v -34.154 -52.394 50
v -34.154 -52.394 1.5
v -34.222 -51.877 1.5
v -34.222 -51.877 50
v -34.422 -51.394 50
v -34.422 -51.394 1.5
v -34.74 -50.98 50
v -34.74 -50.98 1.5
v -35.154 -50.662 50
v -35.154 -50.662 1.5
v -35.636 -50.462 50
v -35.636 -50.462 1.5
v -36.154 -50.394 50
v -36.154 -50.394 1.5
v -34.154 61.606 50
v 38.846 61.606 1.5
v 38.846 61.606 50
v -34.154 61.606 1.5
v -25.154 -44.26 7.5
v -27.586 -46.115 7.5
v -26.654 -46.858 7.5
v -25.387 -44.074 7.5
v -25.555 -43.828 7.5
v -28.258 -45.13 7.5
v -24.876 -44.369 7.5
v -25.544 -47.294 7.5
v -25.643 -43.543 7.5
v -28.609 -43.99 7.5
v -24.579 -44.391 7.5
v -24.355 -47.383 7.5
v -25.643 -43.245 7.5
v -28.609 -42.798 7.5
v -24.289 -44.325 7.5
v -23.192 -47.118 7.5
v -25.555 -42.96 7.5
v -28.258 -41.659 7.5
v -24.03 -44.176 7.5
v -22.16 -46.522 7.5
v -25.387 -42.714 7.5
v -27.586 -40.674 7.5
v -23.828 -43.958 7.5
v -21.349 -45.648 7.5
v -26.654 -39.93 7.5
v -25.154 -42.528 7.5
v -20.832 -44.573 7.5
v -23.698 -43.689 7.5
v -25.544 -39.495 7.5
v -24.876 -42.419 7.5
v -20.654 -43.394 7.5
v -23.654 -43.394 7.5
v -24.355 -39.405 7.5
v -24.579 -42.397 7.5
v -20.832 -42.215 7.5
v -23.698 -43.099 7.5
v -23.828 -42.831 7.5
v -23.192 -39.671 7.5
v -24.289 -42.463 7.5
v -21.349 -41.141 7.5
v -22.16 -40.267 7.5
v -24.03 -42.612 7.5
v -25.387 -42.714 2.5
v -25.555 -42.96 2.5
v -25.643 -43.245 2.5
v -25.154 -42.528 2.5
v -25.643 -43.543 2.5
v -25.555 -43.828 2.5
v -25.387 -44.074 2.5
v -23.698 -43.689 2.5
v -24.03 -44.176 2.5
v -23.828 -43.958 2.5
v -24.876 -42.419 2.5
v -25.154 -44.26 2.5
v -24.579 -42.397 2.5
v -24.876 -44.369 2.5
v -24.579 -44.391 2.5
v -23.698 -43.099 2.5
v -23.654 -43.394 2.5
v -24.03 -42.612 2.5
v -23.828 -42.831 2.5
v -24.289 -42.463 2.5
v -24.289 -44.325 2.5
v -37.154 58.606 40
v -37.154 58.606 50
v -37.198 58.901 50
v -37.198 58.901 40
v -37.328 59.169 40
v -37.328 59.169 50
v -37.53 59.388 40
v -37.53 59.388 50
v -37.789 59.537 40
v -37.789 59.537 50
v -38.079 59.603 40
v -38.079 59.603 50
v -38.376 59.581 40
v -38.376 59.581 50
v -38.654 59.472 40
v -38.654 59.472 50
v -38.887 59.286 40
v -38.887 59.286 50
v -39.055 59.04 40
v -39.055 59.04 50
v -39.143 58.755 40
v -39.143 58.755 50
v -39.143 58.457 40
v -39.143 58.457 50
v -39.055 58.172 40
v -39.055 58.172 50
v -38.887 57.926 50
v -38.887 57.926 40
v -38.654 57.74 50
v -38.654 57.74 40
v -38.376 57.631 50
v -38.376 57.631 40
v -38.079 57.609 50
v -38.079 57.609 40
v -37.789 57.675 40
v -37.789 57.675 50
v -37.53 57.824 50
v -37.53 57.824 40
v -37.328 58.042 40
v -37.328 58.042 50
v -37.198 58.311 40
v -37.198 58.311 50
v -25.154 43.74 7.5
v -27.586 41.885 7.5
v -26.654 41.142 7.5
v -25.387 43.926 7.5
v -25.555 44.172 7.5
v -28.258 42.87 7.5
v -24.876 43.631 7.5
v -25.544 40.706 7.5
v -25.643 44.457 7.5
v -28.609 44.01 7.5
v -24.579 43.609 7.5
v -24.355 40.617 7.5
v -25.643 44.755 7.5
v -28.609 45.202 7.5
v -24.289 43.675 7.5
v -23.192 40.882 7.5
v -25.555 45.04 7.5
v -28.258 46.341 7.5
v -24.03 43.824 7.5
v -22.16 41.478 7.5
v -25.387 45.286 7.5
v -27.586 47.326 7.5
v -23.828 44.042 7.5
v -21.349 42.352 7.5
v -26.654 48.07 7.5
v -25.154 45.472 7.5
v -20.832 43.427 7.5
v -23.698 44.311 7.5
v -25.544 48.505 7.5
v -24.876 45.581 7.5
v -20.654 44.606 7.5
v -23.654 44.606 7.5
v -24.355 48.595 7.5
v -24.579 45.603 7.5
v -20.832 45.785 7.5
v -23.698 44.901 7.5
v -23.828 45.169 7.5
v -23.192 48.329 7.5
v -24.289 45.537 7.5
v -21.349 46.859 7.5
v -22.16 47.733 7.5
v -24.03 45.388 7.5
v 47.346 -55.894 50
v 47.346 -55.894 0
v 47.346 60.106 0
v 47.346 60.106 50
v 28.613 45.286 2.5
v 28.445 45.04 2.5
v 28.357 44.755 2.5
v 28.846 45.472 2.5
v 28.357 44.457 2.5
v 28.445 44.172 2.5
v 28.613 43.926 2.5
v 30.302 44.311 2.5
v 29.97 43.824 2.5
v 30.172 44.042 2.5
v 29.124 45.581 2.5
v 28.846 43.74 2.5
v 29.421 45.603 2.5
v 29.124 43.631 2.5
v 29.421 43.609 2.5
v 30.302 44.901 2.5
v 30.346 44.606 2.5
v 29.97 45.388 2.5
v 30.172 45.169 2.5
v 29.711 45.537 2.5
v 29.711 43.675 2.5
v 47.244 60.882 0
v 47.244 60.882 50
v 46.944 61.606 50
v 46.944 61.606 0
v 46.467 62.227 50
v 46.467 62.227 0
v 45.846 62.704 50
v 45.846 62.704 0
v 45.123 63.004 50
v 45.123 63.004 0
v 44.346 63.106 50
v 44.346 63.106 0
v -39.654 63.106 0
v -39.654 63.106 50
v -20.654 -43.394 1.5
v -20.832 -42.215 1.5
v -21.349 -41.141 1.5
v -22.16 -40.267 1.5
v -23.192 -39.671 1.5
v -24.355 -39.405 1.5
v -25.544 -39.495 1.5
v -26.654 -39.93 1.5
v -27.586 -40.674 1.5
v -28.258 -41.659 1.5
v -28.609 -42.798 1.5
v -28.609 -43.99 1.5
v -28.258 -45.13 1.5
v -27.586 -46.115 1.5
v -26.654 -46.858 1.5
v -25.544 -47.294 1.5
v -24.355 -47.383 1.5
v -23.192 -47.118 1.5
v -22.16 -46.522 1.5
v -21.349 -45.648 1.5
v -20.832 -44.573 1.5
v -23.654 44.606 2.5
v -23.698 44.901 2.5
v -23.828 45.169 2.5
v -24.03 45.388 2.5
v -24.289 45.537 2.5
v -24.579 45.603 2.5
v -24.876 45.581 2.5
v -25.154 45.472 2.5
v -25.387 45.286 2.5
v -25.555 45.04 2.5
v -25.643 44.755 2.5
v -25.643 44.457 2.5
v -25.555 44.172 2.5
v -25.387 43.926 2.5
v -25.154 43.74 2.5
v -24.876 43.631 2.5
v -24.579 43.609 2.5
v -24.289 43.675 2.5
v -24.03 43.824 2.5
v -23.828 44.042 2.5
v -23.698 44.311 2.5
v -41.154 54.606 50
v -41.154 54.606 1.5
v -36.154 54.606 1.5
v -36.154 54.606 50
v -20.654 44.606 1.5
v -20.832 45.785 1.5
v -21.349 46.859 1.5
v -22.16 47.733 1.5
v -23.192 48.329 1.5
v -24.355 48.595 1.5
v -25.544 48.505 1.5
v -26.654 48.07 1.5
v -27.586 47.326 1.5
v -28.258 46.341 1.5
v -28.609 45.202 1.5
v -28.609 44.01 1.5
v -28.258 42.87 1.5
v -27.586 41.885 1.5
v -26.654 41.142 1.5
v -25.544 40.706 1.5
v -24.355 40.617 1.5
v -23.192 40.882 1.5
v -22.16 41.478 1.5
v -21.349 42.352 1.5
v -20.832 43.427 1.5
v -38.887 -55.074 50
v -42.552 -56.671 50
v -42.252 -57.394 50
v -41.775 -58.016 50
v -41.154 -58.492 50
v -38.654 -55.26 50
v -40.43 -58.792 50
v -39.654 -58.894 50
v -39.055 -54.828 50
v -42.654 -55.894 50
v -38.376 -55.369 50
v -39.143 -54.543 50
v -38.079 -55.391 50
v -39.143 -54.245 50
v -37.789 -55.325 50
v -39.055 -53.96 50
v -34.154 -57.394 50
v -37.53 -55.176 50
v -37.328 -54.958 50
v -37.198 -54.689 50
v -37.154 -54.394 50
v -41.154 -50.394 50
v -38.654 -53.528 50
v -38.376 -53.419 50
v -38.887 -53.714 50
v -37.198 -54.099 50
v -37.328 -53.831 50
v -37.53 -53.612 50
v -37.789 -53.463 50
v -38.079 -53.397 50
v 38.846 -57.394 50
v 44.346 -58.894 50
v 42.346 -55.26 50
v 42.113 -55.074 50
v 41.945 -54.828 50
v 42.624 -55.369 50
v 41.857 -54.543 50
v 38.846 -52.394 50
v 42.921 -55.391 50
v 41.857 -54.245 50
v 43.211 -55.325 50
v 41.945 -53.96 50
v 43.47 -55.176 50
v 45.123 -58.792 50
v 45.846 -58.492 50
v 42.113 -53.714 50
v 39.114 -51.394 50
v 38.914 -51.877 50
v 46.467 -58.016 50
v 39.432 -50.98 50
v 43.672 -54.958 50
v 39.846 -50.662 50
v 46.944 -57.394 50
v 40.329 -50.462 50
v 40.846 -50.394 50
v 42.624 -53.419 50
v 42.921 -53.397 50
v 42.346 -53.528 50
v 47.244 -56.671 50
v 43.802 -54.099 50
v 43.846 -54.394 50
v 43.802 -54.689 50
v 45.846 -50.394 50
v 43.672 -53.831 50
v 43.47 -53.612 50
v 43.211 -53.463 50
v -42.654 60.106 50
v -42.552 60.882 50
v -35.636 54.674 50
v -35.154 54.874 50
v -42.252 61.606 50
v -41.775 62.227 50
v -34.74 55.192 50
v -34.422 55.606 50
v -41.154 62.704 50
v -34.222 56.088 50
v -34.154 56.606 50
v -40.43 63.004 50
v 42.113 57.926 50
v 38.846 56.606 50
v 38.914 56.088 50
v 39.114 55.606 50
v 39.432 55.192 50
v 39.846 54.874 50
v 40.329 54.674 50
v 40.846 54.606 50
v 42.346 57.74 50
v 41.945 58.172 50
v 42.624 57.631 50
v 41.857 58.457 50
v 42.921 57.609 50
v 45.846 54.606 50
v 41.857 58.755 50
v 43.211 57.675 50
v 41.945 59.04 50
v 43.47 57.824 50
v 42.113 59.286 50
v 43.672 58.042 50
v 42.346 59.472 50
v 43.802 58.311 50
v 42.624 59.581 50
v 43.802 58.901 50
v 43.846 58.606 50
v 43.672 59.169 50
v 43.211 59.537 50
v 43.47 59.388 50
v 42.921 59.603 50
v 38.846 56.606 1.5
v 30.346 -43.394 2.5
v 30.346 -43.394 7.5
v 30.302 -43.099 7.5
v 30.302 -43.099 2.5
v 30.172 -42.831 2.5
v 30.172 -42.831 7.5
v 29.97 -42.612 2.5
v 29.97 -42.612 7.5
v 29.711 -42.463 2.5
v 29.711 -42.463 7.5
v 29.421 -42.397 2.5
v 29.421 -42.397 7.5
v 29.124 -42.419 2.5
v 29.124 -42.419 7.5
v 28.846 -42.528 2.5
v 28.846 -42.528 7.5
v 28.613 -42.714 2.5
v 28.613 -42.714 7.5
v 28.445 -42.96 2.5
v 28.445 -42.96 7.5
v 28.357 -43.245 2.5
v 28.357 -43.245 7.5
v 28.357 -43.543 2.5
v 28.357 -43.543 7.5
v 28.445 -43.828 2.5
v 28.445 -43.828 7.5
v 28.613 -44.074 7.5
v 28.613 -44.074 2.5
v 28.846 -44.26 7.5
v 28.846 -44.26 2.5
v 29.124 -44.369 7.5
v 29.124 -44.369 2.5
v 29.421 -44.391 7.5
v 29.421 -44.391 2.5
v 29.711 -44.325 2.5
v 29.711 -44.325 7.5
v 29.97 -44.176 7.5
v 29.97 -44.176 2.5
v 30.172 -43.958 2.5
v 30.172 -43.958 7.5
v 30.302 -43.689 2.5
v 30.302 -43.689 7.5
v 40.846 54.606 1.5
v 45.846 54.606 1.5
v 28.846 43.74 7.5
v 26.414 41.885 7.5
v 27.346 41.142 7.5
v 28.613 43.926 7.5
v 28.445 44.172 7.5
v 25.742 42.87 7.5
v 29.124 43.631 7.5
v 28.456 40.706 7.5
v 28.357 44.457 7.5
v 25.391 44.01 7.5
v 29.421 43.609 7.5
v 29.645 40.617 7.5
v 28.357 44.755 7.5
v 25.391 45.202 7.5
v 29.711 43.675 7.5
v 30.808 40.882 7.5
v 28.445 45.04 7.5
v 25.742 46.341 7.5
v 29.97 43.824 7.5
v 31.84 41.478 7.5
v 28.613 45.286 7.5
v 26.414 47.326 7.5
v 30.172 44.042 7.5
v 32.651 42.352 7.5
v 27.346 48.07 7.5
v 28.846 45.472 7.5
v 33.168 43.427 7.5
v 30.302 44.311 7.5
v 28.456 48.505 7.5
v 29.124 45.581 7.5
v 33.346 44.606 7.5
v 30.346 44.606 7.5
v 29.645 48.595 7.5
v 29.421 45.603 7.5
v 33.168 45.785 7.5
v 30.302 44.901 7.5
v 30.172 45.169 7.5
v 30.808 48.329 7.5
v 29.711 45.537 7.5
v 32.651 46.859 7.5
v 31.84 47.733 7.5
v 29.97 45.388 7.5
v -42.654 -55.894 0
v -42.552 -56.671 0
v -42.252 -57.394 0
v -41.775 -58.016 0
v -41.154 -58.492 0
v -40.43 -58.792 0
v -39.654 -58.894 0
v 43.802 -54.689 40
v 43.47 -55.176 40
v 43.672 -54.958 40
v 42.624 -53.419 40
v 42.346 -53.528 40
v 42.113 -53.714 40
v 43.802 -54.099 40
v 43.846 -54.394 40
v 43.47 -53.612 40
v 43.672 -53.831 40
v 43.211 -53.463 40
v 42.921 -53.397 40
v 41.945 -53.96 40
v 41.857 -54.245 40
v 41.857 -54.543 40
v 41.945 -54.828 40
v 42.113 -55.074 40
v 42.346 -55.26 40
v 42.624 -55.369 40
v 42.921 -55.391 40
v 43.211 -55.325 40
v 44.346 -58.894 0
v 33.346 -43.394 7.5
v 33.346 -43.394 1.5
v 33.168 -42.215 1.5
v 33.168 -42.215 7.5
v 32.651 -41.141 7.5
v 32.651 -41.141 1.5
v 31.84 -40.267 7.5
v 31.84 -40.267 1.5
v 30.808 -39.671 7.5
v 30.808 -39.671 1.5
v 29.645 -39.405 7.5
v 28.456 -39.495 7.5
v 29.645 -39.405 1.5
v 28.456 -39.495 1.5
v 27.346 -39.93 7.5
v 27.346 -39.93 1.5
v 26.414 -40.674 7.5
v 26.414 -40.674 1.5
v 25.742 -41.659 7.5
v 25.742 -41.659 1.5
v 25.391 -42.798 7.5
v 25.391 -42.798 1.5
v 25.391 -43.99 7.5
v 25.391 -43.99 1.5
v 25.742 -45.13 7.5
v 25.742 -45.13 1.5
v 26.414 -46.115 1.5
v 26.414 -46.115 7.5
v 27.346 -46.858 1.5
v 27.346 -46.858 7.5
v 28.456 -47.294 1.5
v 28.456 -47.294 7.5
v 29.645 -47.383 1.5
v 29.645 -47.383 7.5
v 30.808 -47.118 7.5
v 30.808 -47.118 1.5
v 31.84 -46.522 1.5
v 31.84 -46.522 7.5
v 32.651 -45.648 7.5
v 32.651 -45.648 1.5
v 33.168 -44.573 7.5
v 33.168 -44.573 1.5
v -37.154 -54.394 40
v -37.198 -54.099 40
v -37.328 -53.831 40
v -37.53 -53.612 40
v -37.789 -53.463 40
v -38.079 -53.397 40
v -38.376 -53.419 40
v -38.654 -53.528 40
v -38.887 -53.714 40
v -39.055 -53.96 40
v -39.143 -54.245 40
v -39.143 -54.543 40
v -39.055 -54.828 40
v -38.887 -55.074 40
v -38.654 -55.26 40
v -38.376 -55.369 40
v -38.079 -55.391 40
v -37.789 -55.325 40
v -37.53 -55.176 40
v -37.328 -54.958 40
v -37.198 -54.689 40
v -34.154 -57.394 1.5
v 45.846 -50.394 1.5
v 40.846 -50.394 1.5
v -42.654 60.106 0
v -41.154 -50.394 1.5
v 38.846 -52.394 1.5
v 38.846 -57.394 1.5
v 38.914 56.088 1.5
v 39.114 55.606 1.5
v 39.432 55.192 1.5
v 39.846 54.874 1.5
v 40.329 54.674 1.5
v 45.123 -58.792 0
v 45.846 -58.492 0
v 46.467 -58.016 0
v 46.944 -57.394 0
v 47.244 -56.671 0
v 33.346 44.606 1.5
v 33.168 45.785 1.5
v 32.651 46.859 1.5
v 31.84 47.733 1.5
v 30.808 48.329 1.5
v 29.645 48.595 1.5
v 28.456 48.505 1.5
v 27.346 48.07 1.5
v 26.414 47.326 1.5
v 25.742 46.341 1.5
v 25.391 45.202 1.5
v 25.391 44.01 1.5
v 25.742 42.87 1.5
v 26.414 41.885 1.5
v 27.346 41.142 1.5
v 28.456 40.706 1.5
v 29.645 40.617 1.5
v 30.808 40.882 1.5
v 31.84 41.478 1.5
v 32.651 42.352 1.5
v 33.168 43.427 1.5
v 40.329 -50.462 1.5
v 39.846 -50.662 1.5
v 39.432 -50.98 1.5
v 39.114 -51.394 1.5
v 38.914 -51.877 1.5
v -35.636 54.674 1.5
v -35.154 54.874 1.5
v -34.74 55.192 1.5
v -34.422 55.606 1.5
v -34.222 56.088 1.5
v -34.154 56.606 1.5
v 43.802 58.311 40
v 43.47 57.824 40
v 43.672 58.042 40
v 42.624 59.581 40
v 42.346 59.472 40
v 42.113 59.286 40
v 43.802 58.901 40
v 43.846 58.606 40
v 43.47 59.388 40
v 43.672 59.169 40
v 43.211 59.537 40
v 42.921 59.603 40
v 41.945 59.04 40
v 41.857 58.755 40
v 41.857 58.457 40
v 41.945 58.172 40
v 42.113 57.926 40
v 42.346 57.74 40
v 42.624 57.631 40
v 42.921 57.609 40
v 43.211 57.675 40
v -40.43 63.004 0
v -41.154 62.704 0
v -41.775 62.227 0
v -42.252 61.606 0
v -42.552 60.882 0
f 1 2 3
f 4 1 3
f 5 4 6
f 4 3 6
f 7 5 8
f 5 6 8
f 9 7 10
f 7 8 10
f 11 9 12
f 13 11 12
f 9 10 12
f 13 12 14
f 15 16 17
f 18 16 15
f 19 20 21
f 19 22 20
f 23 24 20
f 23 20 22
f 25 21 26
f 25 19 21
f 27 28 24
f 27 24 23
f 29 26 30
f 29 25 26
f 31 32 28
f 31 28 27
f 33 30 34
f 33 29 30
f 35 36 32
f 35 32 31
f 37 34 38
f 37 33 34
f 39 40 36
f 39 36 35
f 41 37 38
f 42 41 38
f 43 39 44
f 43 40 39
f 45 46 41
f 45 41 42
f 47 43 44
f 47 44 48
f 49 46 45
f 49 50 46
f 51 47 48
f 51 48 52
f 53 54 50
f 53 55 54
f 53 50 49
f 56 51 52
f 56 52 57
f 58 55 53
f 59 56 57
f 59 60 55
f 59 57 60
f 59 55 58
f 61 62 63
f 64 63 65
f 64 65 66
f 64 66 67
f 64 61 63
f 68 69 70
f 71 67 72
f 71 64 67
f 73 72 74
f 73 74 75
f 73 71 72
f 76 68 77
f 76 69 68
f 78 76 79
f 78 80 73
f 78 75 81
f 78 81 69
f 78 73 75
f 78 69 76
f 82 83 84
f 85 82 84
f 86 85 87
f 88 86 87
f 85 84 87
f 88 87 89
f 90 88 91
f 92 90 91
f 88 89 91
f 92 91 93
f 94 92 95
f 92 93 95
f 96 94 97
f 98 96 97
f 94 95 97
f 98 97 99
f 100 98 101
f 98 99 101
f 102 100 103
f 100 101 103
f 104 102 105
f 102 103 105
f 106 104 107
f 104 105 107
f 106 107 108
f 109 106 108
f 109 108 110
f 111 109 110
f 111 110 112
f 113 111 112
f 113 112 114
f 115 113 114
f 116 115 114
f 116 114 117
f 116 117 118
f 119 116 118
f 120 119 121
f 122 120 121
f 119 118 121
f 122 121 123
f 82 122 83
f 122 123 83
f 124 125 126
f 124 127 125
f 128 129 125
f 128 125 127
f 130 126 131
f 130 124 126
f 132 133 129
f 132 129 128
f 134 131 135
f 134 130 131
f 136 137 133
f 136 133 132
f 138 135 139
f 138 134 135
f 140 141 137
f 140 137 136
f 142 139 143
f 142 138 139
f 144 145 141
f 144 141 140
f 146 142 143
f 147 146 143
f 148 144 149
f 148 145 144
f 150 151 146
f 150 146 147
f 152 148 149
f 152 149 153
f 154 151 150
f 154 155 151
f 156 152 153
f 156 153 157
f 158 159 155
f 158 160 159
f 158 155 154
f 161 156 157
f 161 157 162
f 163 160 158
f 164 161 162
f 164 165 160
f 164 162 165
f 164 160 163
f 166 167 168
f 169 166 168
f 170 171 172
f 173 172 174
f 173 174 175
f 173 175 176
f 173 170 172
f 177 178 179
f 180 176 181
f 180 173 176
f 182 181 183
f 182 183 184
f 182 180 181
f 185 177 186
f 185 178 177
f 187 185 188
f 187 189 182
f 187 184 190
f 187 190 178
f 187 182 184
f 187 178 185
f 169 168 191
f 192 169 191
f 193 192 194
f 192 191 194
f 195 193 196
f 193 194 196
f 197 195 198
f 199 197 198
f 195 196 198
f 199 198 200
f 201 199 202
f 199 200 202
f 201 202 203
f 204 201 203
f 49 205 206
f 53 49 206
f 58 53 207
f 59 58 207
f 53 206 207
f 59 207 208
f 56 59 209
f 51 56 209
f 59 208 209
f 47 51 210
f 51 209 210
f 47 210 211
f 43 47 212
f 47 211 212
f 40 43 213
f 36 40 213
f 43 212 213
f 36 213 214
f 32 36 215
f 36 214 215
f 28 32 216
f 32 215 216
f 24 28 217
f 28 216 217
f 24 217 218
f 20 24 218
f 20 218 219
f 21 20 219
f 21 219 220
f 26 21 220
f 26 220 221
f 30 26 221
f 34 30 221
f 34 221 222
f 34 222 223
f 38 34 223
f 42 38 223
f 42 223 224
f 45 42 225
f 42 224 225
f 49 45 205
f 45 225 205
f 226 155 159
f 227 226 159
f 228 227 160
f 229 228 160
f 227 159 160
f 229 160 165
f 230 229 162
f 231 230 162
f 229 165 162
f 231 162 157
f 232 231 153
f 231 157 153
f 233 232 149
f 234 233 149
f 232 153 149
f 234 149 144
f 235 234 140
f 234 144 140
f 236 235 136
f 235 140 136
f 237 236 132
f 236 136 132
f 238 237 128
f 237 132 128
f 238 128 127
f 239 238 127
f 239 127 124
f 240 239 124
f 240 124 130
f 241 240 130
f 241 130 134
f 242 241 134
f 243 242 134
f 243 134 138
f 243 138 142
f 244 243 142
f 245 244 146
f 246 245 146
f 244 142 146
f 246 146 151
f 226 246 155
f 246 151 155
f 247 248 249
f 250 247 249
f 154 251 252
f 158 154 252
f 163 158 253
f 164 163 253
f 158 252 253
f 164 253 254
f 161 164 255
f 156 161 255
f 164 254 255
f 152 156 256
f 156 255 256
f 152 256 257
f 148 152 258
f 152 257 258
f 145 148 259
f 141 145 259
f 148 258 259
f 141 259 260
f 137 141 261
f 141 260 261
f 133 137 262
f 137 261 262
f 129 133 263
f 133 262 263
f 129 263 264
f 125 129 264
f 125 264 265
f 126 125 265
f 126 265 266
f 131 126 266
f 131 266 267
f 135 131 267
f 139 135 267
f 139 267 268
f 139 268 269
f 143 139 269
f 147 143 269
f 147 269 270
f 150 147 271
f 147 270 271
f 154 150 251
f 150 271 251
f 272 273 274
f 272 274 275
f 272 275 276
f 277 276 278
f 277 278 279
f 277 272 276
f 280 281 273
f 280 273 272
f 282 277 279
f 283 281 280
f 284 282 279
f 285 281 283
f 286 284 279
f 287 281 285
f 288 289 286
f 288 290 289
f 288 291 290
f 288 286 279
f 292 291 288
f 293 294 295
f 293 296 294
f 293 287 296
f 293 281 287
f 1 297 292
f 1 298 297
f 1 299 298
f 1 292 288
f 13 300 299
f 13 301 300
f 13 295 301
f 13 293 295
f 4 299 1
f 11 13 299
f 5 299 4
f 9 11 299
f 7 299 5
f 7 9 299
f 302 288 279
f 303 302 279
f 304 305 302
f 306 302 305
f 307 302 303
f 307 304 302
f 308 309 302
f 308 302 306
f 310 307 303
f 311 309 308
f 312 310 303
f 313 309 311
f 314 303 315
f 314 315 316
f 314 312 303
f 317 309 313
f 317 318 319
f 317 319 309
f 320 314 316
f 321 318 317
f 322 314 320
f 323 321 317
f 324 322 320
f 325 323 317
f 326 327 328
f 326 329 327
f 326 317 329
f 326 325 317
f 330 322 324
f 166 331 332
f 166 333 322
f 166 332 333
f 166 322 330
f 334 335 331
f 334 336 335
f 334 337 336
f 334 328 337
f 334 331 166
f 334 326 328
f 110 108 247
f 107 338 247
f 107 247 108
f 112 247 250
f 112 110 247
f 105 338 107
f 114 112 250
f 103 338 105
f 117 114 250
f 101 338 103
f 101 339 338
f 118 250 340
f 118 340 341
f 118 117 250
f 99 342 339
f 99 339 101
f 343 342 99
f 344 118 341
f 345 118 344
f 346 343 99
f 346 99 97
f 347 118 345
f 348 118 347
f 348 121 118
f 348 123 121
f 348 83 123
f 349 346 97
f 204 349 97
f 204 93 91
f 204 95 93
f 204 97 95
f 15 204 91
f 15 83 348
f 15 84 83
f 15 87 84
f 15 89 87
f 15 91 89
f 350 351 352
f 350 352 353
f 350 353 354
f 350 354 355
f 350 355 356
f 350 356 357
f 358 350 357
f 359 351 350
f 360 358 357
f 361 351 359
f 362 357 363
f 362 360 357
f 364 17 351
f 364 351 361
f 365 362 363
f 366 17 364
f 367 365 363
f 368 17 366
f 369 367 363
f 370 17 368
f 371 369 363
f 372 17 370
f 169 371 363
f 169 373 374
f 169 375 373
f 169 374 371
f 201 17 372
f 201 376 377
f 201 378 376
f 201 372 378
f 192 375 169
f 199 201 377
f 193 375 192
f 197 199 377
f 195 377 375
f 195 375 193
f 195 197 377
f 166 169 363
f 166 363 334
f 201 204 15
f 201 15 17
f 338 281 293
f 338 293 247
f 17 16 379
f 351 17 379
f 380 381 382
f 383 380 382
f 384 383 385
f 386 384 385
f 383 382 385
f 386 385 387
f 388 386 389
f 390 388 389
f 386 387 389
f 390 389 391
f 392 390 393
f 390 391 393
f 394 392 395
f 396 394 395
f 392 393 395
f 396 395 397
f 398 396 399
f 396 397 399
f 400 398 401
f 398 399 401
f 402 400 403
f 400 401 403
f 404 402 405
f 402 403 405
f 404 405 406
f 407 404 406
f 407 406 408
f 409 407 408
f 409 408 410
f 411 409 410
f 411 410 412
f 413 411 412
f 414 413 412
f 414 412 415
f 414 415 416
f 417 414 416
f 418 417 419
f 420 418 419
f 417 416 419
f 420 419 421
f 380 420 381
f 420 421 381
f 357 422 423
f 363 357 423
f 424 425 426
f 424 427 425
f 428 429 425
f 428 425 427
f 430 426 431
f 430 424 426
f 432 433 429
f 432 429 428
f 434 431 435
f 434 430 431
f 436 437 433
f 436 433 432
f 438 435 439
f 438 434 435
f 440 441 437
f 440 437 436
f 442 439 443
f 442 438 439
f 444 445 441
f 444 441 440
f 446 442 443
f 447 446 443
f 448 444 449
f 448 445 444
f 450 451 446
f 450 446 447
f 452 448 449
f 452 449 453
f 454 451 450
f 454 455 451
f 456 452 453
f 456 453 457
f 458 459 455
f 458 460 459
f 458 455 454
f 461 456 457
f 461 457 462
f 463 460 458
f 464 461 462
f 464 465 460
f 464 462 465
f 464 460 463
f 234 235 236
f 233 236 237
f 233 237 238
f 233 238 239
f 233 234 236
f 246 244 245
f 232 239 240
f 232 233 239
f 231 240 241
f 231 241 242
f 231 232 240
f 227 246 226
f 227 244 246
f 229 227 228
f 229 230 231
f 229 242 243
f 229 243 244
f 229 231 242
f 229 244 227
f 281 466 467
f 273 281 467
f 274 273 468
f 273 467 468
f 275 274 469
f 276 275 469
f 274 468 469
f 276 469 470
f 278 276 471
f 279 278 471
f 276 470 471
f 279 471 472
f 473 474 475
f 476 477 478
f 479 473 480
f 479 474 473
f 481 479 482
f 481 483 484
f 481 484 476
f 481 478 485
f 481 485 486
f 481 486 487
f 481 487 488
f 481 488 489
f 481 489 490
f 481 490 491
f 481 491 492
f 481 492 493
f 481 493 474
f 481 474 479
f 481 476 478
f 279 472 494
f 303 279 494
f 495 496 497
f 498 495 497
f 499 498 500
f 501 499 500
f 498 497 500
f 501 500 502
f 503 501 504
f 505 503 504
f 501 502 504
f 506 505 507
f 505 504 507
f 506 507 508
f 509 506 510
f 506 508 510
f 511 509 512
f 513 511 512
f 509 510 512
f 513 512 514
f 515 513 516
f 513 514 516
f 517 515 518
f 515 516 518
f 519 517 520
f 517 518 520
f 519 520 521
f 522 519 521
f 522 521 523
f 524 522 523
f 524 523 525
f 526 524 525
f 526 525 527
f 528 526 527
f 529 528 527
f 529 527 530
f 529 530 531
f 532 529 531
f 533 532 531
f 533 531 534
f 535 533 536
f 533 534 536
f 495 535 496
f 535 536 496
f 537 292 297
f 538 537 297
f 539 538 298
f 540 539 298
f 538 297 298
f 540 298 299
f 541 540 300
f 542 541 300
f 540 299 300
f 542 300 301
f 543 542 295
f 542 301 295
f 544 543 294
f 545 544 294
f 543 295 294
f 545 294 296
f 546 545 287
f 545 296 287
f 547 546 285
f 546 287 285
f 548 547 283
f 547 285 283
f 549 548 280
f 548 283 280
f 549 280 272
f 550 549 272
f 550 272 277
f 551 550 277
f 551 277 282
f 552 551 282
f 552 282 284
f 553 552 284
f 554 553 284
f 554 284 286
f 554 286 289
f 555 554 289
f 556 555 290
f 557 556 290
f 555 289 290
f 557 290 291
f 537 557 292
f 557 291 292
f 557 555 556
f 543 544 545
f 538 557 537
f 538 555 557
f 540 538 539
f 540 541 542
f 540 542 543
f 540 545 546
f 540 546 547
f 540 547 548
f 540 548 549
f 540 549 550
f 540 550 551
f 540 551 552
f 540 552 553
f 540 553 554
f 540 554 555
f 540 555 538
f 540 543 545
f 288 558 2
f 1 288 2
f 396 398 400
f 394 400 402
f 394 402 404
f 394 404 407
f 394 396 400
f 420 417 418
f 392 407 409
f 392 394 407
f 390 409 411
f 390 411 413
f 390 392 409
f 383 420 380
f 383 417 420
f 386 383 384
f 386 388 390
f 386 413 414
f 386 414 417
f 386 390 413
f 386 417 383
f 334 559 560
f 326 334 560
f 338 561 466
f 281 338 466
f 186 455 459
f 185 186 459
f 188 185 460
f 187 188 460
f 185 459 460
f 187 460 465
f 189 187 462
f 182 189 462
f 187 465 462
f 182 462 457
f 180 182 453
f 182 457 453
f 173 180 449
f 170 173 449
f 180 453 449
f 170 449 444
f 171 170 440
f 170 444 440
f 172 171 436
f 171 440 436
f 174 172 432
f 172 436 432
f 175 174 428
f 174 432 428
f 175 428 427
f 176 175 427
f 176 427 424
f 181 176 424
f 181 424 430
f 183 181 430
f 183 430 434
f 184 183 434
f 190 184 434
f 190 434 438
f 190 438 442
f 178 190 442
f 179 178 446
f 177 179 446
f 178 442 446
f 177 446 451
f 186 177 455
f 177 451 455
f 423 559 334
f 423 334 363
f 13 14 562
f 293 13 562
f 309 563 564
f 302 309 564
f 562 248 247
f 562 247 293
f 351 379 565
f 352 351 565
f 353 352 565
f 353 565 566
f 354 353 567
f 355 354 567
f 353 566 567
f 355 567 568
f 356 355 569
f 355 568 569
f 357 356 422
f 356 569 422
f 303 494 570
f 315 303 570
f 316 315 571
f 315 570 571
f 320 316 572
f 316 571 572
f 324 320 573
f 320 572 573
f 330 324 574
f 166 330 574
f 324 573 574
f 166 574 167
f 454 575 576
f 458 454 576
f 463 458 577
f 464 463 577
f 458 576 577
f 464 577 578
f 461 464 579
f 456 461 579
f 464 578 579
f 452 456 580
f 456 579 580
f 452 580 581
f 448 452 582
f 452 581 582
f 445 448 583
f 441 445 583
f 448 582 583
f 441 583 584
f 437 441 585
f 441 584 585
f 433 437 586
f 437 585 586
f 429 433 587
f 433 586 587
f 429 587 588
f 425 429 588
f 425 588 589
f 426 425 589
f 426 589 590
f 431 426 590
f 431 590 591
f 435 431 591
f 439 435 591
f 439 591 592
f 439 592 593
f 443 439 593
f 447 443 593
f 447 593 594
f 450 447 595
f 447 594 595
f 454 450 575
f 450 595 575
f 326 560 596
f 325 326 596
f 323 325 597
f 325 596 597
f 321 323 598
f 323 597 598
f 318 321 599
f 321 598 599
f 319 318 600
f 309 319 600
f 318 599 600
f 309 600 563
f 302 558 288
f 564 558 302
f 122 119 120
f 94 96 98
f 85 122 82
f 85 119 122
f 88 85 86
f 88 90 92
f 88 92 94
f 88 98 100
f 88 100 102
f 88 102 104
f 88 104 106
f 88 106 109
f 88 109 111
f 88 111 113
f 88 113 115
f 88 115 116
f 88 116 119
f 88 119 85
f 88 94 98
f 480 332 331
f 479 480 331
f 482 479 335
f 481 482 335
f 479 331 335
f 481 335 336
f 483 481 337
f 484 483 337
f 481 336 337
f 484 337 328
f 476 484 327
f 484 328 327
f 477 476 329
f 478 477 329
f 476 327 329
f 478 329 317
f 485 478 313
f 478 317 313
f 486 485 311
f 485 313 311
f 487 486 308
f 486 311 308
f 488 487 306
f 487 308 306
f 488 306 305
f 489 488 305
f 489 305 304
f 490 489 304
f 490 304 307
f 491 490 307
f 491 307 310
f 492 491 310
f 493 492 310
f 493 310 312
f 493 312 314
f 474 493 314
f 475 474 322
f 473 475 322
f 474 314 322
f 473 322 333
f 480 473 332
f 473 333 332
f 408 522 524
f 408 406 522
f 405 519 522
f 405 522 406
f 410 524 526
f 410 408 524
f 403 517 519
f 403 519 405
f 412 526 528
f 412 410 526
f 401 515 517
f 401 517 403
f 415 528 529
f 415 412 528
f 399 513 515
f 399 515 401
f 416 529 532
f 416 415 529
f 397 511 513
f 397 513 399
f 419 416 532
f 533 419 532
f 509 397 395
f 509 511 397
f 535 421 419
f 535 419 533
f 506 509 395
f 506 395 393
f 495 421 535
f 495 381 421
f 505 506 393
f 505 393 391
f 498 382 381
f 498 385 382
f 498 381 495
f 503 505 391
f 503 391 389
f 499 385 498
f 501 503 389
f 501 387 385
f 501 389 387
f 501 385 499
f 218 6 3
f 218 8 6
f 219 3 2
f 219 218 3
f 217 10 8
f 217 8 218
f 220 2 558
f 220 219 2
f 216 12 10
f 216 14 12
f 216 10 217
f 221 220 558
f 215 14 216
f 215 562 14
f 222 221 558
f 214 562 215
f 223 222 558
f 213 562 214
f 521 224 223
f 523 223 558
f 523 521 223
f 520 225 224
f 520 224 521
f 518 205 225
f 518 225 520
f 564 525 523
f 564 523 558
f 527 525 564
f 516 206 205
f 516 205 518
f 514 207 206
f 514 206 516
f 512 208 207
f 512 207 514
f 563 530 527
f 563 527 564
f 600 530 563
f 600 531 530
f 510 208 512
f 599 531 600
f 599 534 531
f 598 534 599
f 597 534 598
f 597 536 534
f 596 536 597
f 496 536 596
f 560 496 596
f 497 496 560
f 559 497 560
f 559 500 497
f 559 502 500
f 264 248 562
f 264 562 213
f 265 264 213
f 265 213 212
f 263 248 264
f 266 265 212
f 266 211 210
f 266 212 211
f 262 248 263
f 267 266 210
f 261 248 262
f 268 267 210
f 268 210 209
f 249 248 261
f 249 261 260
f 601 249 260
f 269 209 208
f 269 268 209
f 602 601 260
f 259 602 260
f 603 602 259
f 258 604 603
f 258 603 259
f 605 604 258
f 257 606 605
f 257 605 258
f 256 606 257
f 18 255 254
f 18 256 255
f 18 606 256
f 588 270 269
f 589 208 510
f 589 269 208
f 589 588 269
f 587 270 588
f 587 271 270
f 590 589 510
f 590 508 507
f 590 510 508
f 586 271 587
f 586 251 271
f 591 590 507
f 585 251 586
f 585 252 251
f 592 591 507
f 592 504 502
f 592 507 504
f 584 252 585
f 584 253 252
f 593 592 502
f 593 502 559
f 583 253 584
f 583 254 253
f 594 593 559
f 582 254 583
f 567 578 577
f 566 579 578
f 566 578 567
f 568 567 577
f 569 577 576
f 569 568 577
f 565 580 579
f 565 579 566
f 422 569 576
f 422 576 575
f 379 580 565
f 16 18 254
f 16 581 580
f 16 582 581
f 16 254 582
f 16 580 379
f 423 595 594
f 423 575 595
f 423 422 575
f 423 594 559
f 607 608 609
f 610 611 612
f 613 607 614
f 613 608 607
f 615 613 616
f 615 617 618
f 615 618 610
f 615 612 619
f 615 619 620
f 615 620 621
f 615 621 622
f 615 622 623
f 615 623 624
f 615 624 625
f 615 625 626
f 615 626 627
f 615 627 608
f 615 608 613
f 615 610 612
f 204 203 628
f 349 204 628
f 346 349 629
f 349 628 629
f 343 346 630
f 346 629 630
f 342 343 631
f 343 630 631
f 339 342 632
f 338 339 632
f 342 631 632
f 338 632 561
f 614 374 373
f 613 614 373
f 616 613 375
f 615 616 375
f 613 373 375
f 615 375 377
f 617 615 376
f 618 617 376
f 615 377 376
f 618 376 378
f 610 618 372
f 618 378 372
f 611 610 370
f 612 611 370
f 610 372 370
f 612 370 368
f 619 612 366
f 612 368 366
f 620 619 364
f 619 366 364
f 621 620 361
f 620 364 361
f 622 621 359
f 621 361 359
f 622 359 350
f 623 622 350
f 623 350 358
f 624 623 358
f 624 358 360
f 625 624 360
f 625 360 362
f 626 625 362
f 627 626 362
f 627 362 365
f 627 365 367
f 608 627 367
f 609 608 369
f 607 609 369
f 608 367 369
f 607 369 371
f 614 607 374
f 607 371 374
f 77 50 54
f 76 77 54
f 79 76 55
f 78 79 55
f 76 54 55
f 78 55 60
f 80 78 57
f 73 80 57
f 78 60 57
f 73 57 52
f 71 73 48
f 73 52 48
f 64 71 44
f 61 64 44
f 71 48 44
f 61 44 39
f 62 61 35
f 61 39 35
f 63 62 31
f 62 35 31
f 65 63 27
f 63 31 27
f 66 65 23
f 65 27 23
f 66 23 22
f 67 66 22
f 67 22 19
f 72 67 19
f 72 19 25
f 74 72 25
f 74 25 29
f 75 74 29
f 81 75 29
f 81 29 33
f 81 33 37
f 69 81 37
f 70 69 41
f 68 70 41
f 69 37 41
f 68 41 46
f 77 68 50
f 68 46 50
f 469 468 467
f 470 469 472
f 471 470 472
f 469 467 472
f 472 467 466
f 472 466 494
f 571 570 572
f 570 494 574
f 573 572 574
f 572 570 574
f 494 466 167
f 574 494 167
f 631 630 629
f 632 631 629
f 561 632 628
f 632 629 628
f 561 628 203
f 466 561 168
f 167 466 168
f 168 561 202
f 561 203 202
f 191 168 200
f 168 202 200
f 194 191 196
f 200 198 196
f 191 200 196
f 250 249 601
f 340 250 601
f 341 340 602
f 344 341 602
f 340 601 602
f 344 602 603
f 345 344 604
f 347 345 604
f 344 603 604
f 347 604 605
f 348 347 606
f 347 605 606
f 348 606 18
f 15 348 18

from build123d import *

# Parameters (mm, degrees)
F1_DEPTH  = 50
F2_T      = -1.5
F4_DEPTH  = 48.5
F5_R      = 1
F6_DEPTH  = 10
F7_R      = 4
F8_DEPTH  = 6
F9_R      = 1
F10_DEPTH = 5


with BuildPart() as f1:
    # F0 (on Top) → F1 (new body)
    with BuildSketch(Plane.XY):
        with BuildLine():
            Line((-39.653846, -58.894231), (44.346154, -58.894231))
            ThreePointArc((44.346154, -58.894231), (46.467474, -58.015551), (47.346154, -55.894231))
            Line((47.346154, -55.894231), (47.346154, 60.105769))
            ThreePointArc((47.346154, 60.105769), (46.467474, 62.22709), (44.346154, 63.105769))
            Line((44.346154, 63.105769), (-39.653846, 63.105769))
            ThreePointArc((-39.653846, 63.105769), (-41.775166, 62.22709), (-42.653846, 60.105769))
            Line((-42.653846, 60.105769), (-42.653846, -55.894231))
            ThreePointArc((-42.653846, -55.894231), (-41.775166, -58.015551), (-39.653846, -58.894231))
        make_face()
    extrude(amount=F1_DEPTH)

    # F2
    f2_openings = [f1.faces().sort_by_distance(p)[0] for p in [
        (2.346154, 2.105769, 50),
    ]]
    offset(amount=F2_T, openings=f2_openings)

    # F3 (on face) → F4 (join)
    with BuildSketch(Plane.XY.offset(1.5)):
        with BuildLine():
            Line((45.846154, 61.605769), (38.846154, 61.605769))
            Line((38.846154, 61.605769), (38.846154, 56.605769))
            ThreePointArc((38.846154, 56.605769), (39.43194, 55.191556), (40.846154, 54.605769))
            Line((40.846154, 54.605769), (45.846154, 54.605769))
            Line((45.846154, 54.605769), (45.846154, 61.605769))
        make_face()
        with BuildLine():
            Line((-34.153846, 61.605769), (-41.153846, 61.605769))
            Line((-41.153846, 61.605769), (-41.153846, 54.605769))
            Line((-41.153846, 54.605769), (-36.153846, 54.605769))
            ThreePointArc((-36.153846, 54.605769), (-34.739633, 55.191556), (-34.153846, 56.605769))
            Line((-34.153846, 56.605769), (-34.153846, 61.605769))
        make_face()
        with BuildLine():
            Line((-36.153846, -50.394231), (-41.153846, -50.394231))
            Line((-41.153846, -50.394231), (-41.153846, -57.394231))
            Line((-41.153846, -57.394231), (-34.153846, -57.394231))
            Line((-34.153846, -57.394231), (-34.153846, -52.394231))
            ThreePointArc((-34.153846, -52.394231), (-34.739633, -50.980017), (-36.153846, -50.394231))
        make_face()
        with BuildLine():
            Line((45.846154, -50.394231), (40.846154, -50.394231))
            ThreePointArc((40.846154, -50.394231), (39.43194, -50.980017), (38.846154, -52.394231))
            Line((38.846154, -52.394231), (38.846154, -57.394231))
            Line((38.846154, -57.394231), (45.846154, -57.394231))
            Line((45.846154, -57.394231), (45.846154, -50.394231))
        make_face()
    extrude(amount=F4_DEPTH)

    # F5 (on face) → F6 (cut)
    with BuildSketch(Plane.XY.offset(50)):
        with Locations((42.846154, -54.394231)):
            Circle(F5_R)
        with Locations((-38.153846, -54.394231)):
            Circle(F5_R)
        with Locations((-38.153846, 58.605769)):
            Circle(F5_R)
        with Locations((42.846154, 58.605769)):
            Circle(F5_R)
    extrude(amount=-F6_DEPTH, mode=Mode.SUBTRACT)

    # F7 (on face) → F8 (join)
    with BuildSketch(Plane.XY.offset(1.5)):
        with Locations((29.346154, 44.605769)):
            Circle(F7_R)
        with Locations((-24.653846, -43.394231)):
            Circle(F7_R)
        with Locations((29.346154, -43.394231)):
            Circle(F7_R)
        with Locations((-24.653846, 44.605769)):
            Circle(F7_R)
    extrude(amount=F8_DEPTH)

    # F9 (on face) → F10 (cut)
    with BuildSketch(Plane.XY.offset(7.5)):
        with Locations((29.346154, 44.605769)):
            Circle(F9_R)
        with Locations((-24.653846, -43.394231)):
            Circle(F9_R)
        with Locations((29.346154, -43.394231)):
            Circle(F9_R)
        with Locations((-24.653846, 44.605769)):
            Circle(F9_R)
    extrude(amount=-F10_DEPTH, mode=Mode.SUBTRACT)


solid = f1.part
